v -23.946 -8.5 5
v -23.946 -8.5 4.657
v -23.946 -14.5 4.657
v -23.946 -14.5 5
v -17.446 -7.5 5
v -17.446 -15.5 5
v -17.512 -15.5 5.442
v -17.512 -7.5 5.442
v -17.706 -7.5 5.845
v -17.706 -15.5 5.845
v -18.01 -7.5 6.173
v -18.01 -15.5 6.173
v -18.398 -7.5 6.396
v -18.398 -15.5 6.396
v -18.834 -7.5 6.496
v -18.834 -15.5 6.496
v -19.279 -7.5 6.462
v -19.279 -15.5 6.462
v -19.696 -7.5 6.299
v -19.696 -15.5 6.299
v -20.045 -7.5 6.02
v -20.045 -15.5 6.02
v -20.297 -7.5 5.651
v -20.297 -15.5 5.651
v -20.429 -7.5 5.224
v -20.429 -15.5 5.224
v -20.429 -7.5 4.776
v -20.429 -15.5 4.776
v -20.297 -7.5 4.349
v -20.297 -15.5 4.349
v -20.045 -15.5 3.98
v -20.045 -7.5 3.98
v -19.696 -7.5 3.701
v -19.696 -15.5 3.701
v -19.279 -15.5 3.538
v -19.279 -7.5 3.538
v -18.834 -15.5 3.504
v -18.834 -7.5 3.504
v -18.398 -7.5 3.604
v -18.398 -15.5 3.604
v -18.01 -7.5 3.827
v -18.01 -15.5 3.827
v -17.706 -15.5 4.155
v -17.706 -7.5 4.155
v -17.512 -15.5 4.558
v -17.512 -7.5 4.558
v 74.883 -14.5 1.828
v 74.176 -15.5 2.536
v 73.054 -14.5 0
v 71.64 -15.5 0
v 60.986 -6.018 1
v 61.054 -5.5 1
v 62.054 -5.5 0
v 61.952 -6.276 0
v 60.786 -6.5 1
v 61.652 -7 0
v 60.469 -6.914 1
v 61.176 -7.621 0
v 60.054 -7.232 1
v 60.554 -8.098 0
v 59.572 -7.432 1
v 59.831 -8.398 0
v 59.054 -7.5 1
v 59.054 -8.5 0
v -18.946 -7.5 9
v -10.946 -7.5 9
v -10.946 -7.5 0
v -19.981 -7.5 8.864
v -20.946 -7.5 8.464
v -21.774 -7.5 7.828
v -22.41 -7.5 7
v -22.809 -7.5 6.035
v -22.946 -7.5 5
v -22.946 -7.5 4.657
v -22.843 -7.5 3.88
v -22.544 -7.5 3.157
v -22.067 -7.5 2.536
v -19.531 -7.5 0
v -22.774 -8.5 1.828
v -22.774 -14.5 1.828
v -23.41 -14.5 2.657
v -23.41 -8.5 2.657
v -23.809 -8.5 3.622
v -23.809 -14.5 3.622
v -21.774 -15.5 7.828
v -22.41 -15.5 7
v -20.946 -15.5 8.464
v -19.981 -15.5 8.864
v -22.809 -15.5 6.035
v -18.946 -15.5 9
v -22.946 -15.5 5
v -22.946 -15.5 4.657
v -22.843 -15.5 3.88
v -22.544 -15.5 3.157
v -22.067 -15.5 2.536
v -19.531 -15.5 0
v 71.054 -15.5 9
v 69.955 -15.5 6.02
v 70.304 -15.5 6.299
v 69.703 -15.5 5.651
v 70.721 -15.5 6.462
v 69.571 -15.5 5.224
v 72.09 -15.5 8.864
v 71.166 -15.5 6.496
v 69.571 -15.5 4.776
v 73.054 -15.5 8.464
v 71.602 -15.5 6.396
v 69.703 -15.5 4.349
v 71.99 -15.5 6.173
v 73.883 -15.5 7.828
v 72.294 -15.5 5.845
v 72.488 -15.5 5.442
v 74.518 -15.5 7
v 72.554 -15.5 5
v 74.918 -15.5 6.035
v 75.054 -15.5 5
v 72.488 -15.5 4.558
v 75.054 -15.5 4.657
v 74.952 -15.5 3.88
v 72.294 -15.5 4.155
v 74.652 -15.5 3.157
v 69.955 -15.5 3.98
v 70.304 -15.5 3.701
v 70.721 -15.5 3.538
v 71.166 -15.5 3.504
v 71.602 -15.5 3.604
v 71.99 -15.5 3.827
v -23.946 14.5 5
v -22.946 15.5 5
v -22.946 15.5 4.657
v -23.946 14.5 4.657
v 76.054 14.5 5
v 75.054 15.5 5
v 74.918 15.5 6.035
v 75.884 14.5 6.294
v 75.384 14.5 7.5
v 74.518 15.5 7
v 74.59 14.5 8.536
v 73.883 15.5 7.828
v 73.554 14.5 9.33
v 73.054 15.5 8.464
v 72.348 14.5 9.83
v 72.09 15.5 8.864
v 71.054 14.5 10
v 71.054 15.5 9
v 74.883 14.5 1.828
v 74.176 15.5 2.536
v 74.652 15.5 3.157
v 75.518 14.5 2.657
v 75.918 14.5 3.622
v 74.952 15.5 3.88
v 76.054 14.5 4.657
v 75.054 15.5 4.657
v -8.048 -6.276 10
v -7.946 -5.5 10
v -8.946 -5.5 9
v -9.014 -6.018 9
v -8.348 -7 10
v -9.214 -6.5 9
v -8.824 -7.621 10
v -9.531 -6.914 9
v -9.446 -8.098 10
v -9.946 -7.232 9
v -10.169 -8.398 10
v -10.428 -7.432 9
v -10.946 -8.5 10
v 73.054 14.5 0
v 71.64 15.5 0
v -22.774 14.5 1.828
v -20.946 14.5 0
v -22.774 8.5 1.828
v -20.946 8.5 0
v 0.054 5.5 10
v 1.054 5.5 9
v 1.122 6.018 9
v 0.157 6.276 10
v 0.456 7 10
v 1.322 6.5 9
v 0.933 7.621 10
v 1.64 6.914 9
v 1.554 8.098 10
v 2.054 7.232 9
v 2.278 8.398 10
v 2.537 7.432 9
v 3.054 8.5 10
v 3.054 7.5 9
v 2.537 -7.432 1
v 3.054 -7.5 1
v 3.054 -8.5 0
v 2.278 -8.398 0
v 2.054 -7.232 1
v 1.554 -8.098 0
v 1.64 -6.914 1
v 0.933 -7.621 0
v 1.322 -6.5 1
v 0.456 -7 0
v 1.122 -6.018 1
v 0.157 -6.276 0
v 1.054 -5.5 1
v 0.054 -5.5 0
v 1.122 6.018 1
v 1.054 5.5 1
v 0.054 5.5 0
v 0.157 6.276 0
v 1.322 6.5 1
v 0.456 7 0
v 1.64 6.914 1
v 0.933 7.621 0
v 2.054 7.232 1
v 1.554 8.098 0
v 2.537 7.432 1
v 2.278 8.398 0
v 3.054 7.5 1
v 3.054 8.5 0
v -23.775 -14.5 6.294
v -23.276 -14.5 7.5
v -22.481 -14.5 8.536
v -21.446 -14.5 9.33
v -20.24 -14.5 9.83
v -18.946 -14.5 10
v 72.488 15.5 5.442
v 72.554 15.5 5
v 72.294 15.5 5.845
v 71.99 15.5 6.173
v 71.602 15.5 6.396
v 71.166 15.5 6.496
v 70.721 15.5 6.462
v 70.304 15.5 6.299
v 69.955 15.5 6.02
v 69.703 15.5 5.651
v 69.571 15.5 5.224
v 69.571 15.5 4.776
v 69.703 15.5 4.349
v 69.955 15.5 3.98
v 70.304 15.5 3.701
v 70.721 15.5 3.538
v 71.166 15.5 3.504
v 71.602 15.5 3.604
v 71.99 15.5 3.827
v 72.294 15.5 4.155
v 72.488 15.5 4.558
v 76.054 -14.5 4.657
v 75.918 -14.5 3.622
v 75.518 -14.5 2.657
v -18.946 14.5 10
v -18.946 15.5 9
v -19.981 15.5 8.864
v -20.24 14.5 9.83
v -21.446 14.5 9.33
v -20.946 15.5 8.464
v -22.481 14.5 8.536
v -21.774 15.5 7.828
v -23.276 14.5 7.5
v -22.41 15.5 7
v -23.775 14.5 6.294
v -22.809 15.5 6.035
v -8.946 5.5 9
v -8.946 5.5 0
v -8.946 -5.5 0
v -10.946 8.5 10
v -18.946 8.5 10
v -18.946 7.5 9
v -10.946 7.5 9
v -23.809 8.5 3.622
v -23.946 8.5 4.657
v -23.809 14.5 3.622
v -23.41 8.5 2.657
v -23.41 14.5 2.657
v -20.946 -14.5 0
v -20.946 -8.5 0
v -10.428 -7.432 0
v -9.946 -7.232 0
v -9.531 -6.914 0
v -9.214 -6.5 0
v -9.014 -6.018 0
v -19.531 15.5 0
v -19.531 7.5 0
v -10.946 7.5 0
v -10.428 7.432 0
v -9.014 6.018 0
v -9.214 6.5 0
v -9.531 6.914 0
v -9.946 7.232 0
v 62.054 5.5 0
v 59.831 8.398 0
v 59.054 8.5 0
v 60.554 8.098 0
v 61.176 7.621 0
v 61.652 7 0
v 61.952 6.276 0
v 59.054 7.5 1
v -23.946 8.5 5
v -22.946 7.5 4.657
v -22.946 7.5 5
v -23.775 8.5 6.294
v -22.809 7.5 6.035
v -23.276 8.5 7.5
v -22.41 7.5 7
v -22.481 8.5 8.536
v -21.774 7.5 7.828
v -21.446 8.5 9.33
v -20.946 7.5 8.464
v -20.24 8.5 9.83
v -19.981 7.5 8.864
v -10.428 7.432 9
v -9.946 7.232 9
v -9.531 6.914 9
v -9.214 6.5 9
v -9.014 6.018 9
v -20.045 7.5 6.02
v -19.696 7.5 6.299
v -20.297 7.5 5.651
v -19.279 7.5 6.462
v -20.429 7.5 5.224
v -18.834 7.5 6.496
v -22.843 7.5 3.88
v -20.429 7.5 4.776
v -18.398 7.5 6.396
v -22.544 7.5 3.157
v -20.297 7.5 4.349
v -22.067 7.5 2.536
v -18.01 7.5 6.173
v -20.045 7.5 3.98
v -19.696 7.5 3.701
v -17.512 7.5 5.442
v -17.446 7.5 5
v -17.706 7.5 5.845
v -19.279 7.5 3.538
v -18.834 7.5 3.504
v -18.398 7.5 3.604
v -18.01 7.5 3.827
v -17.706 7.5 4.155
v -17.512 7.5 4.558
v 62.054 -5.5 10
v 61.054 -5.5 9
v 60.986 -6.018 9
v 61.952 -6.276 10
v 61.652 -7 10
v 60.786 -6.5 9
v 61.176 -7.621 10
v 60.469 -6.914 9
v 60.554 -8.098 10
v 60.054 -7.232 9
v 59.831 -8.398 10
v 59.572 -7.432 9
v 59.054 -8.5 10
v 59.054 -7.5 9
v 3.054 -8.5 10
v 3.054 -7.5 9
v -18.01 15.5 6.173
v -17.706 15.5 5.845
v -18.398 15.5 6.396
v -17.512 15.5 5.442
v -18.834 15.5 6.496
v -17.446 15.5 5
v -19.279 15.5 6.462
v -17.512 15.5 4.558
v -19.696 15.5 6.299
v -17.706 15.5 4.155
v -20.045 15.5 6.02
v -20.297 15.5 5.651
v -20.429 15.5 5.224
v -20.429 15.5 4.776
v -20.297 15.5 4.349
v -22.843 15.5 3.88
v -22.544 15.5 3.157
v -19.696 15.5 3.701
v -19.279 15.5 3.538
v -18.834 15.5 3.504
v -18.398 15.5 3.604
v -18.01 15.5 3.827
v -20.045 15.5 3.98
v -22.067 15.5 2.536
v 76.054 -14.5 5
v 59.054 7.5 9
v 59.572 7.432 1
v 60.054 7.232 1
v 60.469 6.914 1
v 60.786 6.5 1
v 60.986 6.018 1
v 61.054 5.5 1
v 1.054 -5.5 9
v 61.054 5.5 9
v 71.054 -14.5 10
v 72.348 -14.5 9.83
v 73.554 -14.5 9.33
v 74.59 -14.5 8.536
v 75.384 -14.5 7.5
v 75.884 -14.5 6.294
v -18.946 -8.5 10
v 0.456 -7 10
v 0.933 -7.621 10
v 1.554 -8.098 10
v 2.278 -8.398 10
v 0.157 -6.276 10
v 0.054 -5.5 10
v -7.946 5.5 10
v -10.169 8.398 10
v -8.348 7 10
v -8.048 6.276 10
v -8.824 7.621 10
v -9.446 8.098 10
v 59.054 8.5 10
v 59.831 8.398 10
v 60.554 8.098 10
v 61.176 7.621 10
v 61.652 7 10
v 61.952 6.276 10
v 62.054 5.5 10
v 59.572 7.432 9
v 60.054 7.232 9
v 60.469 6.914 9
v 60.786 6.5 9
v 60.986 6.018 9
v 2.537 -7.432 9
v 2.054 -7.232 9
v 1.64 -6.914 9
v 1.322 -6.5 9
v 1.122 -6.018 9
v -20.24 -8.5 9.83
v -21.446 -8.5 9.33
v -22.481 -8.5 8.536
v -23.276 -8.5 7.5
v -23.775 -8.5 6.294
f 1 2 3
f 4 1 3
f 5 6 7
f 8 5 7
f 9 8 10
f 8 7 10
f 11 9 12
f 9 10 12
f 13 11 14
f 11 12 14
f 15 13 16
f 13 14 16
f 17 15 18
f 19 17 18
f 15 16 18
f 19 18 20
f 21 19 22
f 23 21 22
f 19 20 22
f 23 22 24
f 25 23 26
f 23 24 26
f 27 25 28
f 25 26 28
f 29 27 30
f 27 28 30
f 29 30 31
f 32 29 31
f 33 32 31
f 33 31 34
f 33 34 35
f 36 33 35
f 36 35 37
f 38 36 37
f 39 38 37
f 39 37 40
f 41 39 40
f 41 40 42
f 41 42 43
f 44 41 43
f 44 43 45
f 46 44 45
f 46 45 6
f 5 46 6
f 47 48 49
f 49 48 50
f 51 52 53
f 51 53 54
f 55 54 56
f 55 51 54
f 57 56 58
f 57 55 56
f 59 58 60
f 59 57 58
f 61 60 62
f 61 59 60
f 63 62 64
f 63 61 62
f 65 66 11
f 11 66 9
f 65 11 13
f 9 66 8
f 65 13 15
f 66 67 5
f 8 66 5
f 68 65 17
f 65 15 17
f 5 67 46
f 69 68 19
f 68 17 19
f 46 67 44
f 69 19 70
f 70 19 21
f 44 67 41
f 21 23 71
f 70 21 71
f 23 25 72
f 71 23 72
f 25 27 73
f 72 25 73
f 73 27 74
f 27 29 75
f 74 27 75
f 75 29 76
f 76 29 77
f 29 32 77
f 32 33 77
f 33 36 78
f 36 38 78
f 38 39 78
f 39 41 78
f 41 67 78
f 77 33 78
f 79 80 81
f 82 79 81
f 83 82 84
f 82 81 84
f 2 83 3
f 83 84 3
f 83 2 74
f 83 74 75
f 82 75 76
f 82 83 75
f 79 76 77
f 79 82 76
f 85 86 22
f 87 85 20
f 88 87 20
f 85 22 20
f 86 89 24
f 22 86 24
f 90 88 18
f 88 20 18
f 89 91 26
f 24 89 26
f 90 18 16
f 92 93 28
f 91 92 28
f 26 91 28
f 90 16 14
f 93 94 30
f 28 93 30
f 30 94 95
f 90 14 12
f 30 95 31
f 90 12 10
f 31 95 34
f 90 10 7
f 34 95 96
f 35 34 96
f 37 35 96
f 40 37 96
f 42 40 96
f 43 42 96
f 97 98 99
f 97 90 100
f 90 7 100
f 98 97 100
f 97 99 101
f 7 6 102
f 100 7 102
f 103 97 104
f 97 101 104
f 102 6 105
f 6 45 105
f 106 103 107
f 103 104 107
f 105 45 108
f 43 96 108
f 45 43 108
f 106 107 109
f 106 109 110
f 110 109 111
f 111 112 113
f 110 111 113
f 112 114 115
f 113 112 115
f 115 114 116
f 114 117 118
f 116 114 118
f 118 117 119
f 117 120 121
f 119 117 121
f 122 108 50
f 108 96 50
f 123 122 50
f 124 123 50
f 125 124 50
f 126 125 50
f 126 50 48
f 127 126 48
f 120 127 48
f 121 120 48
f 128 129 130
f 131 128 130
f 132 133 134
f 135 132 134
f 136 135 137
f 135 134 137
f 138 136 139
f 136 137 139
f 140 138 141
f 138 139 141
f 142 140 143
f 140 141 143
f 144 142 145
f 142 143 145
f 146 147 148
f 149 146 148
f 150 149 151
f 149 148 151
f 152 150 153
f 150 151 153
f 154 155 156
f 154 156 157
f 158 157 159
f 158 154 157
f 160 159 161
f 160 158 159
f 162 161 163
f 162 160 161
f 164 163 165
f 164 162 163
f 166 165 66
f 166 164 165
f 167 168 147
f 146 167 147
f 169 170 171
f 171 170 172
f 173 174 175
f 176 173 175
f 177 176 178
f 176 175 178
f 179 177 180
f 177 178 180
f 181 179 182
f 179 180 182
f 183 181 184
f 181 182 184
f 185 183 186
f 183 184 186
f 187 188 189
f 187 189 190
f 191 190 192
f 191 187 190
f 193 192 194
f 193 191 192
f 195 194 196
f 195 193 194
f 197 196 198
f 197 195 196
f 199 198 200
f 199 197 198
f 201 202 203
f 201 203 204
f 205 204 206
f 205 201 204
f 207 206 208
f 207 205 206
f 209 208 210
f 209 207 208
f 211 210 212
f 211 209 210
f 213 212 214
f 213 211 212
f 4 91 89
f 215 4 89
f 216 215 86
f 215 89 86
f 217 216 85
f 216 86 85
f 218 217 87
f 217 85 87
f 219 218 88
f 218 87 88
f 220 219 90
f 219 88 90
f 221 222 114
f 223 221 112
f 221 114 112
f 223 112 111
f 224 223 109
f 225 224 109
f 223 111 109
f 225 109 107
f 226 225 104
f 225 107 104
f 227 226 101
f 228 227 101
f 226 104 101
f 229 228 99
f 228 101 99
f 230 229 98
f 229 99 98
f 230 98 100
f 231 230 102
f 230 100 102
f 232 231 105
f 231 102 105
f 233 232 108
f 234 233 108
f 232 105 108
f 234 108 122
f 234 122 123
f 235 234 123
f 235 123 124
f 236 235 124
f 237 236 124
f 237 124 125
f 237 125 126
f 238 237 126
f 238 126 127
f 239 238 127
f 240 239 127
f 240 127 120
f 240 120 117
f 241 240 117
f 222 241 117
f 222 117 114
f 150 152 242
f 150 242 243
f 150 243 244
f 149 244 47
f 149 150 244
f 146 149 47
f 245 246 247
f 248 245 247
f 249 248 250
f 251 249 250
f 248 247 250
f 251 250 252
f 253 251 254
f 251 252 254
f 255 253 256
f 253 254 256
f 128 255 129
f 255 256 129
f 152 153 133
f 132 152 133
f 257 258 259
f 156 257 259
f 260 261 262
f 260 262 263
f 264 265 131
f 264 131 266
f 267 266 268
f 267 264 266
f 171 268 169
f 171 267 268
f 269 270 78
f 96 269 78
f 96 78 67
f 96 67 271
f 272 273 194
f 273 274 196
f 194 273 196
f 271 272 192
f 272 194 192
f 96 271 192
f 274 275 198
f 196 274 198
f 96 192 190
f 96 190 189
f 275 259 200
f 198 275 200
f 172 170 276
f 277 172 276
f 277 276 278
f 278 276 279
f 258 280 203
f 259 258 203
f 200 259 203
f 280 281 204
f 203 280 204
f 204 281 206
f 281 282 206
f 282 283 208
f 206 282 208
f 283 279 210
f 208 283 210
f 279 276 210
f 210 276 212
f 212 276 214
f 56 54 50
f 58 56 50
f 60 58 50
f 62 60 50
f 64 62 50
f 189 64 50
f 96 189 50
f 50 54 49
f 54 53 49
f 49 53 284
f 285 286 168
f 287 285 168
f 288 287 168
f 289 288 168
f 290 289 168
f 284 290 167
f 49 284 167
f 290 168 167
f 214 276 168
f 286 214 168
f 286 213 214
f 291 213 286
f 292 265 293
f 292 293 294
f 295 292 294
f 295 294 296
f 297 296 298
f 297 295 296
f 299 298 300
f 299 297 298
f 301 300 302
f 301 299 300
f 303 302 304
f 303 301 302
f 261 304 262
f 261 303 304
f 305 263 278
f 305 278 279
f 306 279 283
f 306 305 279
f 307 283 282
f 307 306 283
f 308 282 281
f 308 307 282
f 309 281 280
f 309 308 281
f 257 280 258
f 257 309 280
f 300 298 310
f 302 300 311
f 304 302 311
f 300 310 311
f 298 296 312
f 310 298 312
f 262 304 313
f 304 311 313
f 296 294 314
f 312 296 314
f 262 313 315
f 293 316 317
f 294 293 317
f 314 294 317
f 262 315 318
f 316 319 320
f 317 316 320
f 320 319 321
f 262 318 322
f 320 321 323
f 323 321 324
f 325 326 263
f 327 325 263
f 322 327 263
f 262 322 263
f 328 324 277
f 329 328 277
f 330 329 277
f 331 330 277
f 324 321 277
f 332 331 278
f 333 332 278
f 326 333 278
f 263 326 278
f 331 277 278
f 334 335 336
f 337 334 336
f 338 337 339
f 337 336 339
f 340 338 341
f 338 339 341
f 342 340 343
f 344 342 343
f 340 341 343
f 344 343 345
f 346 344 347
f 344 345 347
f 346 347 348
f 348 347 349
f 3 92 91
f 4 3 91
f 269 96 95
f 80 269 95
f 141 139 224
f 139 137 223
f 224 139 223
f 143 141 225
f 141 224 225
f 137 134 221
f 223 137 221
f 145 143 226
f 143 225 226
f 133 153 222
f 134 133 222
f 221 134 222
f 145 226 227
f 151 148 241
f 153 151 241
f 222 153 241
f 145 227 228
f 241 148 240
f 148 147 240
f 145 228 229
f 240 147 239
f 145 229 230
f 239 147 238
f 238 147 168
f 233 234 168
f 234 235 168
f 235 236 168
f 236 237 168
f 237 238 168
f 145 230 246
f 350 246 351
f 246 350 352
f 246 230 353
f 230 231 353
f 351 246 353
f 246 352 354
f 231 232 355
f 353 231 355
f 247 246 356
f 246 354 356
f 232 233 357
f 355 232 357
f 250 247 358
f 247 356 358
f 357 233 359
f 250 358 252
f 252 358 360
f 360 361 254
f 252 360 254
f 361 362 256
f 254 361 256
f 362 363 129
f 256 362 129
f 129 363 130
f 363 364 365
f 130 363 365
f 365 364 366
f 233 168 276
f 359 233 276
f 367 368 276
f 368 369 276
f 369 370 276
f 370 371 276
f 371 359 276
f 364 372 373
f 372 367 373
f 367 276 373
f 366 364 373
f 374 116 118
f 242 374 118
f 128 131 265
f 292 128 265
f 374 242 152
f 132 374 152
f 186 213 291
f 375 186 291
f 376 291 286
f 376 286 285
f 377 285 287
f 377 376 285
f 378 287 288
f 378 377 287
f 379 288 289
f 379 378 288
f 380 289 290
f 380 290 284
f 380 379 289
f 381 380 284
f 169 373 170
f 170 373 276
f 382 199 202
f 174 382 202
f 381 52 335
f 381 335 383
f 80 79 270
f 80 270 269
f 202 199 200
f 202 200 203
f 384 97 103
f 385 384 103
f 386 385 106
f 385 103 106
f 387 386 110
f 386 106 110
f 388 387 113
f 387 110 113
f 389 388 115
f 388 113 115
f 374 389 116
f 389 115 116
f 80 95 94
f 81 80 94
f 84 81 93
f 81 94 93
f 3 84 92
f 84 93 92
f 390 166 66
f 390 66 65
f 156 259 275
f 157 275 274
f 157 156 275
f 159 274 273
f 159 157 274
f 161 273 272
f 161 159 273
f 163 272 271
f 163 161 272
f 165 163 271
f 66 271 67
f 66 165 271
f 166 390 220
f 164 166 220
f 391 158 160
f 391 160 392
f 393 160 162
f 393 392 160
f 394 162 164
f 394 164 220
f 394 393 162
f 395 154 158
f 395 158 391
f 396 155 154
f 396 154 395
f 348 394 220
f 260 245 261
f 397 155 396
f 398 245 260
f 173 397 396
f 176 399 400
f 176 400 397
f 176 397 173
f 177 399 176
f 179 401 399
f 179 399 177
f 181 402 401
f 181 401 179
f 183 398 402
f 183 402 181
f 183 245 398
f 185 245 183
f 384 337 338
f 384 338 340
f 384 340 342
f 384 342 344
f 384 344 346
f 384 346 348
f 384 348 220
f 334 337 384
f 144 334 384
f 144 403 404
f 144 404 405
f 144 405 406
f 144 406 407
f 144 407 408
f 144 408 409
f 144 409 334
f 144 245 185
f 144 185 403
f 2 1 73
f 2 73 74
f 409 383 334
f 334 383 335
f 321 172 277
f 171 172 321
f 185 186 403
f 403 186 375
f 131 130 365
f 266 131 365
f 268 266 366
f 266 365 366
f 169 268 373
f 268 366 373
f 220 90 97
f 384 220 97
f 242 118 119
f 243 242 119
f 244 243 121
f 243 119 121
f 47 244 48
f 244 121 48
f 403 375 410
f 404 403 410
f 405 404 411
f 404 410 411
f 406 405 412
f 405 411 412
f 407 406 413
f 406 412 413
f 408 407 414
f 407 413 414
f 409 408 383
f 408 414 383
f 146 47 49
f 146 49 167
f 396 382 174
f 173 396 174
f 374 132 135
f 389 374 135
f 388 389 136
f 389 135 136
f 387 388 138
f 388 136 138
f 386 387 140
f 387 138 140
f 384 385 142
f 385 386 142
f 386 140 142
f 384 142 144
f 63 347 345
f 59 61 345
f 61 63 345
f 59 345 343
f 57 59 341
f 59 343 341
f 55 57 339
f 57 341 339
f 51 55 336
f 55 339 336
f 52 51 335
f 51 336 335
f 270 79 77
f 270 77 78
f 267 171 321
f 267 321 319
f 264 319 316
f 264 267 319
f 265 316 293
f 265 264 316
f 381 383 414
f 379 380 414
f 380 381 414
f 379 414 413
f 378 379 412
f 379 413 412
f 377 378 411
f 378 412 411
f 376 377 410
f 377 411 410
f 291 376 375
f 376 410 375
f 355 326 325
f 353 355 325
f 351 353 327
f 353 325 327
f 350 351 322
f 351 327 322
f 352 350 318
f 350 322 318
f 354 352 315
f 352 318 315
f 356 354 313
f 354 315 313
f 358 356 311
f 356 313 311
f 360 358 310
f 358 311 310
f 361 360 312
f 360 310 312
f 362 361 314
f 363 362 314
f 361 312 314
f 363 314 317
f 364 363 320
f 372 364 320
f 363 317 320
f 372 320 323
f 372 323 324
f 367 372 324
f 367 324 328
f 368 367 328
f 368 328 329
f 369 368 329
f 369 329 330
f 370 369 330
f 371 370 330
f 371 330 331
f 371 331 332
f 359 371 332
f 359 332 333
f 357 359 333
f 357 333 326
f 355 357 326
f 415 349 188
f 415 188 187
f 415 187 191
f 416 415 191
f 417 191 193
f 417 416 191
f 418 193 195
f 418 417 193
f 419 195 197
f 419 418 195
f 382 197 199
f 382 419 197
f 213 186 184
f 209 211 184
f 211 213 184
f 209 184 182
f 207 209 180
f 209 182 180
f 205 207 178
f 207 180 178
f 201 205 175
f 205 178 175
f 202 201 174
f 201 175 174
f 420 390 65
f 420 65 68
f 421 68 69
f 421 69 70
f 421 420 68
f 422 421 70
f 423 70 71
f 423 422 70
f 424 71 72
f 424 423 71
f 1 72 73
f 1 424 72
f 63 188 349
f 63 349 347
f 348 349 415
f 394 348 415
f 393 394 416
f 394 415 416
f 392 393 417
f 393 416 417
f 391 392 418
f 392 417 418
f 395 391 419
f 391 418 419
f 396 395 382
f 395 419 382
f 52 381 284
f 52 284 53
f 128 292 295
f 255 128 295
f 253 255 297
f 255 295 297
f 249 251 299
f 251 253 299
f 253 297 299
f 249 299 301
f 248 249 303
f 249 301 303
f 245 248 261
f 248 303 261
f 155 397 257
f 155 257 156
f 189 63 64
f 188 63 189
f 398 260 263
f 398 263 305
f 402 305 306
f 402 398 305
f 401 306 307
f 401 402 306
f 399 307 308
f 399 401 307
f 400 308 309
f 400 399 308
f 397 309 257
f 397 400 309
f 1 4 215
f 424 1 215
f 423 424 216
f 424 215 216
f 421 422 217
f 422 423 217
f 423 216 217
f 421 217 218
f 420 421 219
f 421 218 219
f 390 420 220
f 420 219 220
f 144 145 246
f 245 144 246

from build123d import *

# Parameters (mm, degrees)
F0_W     = 60
F0_H     = 15
F1_DEPTH = 10
F2_R     = 5
F3_SIZE  = 3
F4_R     = 4
F5_R     = 2
F6_R     = 1.5
F7_DEPTH = 31.001
F8_SIZE  = 1


with BuildPart() as f1:
    # F0 (on Top) → F1 (new body)
    with BuildSketch(Plane.XY):
        Polygon((-23.9456994958, 15.5), (-23.9456994958, 7.5), (-8.9456994958, 7.5), (-8.9456994958, -7.5), (-23.9456994958, -7.5), (-23.9456994958, -15.5), (76.0543005042, -15.5), (76.0543005042, 15.5), align=None)
        with Locations((31.0543005042, 0)):
            Rectangle(F0_W, F0_H, mode=Mode.SUBTRACT)
    extrude(amount=F1_DEPTH)

    # F2
    f2_edges = [f1.edges().sort_by_distance(p)[0] for p in [
        (-23.945699, 11.5, 10),
        (-23.945699, -11.5, 10),
        (76.054301, 0, 10),
    ]]
    fillet(f2_edges, radius=F2_R)

    # F3
    f3_edges = [f1.edges().sort_by_distance(p)[0] for p in [
        (-23.945699, 11.5, 0),
        (-23.945699, -11.5, 0),
        (76.054301, 0, 0),
    ]]
    chamfer(f3_edges, length=F3_SIZE)

    # F4
    f4_edges = [f1.edges().sort_by_distance(p)[0] for p in [
        (76.054301, 0, 3),
        (-23.945699, -11.5, 3),
        (-23.945699, 11.5, 3),
    ]]
    fillet(f4_edges, radius=F4_R)

    # F5
    f5_edges = [f1.edges().sort_by_distance(p)[0] for p in [
        (-8.945699, 7.5, 5),
        (-8.945699, -7.5, 5),
        (1.054301, 7.5, 5),
        (1.054301, -7.5, 5),
        (61.054301, 7.5, 5),
        (61.054301, -7.5, 5),
    ]]
    fillet(f5_edges, radius=F5_R)

    # F6 (on face) → F7 (cut, through all)
    with BuildSketch(Plane.XZ.offset(15.5)):
        with Locations((-18.9456994958, 5)):
            Circle(F6_R)
        with Locations((71.0543005042, 5)):
            Circle(F6_R)
    extrude(amount=-F7_DEPTH, mode=Mode.SUBTRACT)

    # F8
    f8_edges = [f1.edges().sort_by_distance(p)[0] for p in [
        (-14.945699, 7.5, 10),
        (26.054301, 15.5, 10),
        (31.054301, 7.5, 10),
        (31.054301, 7.5, 0),
        (26.054301, -15.5, 10),
    ]]
    chamfer(f8_edges, length=F8_SIZE)


solid = f1.part
